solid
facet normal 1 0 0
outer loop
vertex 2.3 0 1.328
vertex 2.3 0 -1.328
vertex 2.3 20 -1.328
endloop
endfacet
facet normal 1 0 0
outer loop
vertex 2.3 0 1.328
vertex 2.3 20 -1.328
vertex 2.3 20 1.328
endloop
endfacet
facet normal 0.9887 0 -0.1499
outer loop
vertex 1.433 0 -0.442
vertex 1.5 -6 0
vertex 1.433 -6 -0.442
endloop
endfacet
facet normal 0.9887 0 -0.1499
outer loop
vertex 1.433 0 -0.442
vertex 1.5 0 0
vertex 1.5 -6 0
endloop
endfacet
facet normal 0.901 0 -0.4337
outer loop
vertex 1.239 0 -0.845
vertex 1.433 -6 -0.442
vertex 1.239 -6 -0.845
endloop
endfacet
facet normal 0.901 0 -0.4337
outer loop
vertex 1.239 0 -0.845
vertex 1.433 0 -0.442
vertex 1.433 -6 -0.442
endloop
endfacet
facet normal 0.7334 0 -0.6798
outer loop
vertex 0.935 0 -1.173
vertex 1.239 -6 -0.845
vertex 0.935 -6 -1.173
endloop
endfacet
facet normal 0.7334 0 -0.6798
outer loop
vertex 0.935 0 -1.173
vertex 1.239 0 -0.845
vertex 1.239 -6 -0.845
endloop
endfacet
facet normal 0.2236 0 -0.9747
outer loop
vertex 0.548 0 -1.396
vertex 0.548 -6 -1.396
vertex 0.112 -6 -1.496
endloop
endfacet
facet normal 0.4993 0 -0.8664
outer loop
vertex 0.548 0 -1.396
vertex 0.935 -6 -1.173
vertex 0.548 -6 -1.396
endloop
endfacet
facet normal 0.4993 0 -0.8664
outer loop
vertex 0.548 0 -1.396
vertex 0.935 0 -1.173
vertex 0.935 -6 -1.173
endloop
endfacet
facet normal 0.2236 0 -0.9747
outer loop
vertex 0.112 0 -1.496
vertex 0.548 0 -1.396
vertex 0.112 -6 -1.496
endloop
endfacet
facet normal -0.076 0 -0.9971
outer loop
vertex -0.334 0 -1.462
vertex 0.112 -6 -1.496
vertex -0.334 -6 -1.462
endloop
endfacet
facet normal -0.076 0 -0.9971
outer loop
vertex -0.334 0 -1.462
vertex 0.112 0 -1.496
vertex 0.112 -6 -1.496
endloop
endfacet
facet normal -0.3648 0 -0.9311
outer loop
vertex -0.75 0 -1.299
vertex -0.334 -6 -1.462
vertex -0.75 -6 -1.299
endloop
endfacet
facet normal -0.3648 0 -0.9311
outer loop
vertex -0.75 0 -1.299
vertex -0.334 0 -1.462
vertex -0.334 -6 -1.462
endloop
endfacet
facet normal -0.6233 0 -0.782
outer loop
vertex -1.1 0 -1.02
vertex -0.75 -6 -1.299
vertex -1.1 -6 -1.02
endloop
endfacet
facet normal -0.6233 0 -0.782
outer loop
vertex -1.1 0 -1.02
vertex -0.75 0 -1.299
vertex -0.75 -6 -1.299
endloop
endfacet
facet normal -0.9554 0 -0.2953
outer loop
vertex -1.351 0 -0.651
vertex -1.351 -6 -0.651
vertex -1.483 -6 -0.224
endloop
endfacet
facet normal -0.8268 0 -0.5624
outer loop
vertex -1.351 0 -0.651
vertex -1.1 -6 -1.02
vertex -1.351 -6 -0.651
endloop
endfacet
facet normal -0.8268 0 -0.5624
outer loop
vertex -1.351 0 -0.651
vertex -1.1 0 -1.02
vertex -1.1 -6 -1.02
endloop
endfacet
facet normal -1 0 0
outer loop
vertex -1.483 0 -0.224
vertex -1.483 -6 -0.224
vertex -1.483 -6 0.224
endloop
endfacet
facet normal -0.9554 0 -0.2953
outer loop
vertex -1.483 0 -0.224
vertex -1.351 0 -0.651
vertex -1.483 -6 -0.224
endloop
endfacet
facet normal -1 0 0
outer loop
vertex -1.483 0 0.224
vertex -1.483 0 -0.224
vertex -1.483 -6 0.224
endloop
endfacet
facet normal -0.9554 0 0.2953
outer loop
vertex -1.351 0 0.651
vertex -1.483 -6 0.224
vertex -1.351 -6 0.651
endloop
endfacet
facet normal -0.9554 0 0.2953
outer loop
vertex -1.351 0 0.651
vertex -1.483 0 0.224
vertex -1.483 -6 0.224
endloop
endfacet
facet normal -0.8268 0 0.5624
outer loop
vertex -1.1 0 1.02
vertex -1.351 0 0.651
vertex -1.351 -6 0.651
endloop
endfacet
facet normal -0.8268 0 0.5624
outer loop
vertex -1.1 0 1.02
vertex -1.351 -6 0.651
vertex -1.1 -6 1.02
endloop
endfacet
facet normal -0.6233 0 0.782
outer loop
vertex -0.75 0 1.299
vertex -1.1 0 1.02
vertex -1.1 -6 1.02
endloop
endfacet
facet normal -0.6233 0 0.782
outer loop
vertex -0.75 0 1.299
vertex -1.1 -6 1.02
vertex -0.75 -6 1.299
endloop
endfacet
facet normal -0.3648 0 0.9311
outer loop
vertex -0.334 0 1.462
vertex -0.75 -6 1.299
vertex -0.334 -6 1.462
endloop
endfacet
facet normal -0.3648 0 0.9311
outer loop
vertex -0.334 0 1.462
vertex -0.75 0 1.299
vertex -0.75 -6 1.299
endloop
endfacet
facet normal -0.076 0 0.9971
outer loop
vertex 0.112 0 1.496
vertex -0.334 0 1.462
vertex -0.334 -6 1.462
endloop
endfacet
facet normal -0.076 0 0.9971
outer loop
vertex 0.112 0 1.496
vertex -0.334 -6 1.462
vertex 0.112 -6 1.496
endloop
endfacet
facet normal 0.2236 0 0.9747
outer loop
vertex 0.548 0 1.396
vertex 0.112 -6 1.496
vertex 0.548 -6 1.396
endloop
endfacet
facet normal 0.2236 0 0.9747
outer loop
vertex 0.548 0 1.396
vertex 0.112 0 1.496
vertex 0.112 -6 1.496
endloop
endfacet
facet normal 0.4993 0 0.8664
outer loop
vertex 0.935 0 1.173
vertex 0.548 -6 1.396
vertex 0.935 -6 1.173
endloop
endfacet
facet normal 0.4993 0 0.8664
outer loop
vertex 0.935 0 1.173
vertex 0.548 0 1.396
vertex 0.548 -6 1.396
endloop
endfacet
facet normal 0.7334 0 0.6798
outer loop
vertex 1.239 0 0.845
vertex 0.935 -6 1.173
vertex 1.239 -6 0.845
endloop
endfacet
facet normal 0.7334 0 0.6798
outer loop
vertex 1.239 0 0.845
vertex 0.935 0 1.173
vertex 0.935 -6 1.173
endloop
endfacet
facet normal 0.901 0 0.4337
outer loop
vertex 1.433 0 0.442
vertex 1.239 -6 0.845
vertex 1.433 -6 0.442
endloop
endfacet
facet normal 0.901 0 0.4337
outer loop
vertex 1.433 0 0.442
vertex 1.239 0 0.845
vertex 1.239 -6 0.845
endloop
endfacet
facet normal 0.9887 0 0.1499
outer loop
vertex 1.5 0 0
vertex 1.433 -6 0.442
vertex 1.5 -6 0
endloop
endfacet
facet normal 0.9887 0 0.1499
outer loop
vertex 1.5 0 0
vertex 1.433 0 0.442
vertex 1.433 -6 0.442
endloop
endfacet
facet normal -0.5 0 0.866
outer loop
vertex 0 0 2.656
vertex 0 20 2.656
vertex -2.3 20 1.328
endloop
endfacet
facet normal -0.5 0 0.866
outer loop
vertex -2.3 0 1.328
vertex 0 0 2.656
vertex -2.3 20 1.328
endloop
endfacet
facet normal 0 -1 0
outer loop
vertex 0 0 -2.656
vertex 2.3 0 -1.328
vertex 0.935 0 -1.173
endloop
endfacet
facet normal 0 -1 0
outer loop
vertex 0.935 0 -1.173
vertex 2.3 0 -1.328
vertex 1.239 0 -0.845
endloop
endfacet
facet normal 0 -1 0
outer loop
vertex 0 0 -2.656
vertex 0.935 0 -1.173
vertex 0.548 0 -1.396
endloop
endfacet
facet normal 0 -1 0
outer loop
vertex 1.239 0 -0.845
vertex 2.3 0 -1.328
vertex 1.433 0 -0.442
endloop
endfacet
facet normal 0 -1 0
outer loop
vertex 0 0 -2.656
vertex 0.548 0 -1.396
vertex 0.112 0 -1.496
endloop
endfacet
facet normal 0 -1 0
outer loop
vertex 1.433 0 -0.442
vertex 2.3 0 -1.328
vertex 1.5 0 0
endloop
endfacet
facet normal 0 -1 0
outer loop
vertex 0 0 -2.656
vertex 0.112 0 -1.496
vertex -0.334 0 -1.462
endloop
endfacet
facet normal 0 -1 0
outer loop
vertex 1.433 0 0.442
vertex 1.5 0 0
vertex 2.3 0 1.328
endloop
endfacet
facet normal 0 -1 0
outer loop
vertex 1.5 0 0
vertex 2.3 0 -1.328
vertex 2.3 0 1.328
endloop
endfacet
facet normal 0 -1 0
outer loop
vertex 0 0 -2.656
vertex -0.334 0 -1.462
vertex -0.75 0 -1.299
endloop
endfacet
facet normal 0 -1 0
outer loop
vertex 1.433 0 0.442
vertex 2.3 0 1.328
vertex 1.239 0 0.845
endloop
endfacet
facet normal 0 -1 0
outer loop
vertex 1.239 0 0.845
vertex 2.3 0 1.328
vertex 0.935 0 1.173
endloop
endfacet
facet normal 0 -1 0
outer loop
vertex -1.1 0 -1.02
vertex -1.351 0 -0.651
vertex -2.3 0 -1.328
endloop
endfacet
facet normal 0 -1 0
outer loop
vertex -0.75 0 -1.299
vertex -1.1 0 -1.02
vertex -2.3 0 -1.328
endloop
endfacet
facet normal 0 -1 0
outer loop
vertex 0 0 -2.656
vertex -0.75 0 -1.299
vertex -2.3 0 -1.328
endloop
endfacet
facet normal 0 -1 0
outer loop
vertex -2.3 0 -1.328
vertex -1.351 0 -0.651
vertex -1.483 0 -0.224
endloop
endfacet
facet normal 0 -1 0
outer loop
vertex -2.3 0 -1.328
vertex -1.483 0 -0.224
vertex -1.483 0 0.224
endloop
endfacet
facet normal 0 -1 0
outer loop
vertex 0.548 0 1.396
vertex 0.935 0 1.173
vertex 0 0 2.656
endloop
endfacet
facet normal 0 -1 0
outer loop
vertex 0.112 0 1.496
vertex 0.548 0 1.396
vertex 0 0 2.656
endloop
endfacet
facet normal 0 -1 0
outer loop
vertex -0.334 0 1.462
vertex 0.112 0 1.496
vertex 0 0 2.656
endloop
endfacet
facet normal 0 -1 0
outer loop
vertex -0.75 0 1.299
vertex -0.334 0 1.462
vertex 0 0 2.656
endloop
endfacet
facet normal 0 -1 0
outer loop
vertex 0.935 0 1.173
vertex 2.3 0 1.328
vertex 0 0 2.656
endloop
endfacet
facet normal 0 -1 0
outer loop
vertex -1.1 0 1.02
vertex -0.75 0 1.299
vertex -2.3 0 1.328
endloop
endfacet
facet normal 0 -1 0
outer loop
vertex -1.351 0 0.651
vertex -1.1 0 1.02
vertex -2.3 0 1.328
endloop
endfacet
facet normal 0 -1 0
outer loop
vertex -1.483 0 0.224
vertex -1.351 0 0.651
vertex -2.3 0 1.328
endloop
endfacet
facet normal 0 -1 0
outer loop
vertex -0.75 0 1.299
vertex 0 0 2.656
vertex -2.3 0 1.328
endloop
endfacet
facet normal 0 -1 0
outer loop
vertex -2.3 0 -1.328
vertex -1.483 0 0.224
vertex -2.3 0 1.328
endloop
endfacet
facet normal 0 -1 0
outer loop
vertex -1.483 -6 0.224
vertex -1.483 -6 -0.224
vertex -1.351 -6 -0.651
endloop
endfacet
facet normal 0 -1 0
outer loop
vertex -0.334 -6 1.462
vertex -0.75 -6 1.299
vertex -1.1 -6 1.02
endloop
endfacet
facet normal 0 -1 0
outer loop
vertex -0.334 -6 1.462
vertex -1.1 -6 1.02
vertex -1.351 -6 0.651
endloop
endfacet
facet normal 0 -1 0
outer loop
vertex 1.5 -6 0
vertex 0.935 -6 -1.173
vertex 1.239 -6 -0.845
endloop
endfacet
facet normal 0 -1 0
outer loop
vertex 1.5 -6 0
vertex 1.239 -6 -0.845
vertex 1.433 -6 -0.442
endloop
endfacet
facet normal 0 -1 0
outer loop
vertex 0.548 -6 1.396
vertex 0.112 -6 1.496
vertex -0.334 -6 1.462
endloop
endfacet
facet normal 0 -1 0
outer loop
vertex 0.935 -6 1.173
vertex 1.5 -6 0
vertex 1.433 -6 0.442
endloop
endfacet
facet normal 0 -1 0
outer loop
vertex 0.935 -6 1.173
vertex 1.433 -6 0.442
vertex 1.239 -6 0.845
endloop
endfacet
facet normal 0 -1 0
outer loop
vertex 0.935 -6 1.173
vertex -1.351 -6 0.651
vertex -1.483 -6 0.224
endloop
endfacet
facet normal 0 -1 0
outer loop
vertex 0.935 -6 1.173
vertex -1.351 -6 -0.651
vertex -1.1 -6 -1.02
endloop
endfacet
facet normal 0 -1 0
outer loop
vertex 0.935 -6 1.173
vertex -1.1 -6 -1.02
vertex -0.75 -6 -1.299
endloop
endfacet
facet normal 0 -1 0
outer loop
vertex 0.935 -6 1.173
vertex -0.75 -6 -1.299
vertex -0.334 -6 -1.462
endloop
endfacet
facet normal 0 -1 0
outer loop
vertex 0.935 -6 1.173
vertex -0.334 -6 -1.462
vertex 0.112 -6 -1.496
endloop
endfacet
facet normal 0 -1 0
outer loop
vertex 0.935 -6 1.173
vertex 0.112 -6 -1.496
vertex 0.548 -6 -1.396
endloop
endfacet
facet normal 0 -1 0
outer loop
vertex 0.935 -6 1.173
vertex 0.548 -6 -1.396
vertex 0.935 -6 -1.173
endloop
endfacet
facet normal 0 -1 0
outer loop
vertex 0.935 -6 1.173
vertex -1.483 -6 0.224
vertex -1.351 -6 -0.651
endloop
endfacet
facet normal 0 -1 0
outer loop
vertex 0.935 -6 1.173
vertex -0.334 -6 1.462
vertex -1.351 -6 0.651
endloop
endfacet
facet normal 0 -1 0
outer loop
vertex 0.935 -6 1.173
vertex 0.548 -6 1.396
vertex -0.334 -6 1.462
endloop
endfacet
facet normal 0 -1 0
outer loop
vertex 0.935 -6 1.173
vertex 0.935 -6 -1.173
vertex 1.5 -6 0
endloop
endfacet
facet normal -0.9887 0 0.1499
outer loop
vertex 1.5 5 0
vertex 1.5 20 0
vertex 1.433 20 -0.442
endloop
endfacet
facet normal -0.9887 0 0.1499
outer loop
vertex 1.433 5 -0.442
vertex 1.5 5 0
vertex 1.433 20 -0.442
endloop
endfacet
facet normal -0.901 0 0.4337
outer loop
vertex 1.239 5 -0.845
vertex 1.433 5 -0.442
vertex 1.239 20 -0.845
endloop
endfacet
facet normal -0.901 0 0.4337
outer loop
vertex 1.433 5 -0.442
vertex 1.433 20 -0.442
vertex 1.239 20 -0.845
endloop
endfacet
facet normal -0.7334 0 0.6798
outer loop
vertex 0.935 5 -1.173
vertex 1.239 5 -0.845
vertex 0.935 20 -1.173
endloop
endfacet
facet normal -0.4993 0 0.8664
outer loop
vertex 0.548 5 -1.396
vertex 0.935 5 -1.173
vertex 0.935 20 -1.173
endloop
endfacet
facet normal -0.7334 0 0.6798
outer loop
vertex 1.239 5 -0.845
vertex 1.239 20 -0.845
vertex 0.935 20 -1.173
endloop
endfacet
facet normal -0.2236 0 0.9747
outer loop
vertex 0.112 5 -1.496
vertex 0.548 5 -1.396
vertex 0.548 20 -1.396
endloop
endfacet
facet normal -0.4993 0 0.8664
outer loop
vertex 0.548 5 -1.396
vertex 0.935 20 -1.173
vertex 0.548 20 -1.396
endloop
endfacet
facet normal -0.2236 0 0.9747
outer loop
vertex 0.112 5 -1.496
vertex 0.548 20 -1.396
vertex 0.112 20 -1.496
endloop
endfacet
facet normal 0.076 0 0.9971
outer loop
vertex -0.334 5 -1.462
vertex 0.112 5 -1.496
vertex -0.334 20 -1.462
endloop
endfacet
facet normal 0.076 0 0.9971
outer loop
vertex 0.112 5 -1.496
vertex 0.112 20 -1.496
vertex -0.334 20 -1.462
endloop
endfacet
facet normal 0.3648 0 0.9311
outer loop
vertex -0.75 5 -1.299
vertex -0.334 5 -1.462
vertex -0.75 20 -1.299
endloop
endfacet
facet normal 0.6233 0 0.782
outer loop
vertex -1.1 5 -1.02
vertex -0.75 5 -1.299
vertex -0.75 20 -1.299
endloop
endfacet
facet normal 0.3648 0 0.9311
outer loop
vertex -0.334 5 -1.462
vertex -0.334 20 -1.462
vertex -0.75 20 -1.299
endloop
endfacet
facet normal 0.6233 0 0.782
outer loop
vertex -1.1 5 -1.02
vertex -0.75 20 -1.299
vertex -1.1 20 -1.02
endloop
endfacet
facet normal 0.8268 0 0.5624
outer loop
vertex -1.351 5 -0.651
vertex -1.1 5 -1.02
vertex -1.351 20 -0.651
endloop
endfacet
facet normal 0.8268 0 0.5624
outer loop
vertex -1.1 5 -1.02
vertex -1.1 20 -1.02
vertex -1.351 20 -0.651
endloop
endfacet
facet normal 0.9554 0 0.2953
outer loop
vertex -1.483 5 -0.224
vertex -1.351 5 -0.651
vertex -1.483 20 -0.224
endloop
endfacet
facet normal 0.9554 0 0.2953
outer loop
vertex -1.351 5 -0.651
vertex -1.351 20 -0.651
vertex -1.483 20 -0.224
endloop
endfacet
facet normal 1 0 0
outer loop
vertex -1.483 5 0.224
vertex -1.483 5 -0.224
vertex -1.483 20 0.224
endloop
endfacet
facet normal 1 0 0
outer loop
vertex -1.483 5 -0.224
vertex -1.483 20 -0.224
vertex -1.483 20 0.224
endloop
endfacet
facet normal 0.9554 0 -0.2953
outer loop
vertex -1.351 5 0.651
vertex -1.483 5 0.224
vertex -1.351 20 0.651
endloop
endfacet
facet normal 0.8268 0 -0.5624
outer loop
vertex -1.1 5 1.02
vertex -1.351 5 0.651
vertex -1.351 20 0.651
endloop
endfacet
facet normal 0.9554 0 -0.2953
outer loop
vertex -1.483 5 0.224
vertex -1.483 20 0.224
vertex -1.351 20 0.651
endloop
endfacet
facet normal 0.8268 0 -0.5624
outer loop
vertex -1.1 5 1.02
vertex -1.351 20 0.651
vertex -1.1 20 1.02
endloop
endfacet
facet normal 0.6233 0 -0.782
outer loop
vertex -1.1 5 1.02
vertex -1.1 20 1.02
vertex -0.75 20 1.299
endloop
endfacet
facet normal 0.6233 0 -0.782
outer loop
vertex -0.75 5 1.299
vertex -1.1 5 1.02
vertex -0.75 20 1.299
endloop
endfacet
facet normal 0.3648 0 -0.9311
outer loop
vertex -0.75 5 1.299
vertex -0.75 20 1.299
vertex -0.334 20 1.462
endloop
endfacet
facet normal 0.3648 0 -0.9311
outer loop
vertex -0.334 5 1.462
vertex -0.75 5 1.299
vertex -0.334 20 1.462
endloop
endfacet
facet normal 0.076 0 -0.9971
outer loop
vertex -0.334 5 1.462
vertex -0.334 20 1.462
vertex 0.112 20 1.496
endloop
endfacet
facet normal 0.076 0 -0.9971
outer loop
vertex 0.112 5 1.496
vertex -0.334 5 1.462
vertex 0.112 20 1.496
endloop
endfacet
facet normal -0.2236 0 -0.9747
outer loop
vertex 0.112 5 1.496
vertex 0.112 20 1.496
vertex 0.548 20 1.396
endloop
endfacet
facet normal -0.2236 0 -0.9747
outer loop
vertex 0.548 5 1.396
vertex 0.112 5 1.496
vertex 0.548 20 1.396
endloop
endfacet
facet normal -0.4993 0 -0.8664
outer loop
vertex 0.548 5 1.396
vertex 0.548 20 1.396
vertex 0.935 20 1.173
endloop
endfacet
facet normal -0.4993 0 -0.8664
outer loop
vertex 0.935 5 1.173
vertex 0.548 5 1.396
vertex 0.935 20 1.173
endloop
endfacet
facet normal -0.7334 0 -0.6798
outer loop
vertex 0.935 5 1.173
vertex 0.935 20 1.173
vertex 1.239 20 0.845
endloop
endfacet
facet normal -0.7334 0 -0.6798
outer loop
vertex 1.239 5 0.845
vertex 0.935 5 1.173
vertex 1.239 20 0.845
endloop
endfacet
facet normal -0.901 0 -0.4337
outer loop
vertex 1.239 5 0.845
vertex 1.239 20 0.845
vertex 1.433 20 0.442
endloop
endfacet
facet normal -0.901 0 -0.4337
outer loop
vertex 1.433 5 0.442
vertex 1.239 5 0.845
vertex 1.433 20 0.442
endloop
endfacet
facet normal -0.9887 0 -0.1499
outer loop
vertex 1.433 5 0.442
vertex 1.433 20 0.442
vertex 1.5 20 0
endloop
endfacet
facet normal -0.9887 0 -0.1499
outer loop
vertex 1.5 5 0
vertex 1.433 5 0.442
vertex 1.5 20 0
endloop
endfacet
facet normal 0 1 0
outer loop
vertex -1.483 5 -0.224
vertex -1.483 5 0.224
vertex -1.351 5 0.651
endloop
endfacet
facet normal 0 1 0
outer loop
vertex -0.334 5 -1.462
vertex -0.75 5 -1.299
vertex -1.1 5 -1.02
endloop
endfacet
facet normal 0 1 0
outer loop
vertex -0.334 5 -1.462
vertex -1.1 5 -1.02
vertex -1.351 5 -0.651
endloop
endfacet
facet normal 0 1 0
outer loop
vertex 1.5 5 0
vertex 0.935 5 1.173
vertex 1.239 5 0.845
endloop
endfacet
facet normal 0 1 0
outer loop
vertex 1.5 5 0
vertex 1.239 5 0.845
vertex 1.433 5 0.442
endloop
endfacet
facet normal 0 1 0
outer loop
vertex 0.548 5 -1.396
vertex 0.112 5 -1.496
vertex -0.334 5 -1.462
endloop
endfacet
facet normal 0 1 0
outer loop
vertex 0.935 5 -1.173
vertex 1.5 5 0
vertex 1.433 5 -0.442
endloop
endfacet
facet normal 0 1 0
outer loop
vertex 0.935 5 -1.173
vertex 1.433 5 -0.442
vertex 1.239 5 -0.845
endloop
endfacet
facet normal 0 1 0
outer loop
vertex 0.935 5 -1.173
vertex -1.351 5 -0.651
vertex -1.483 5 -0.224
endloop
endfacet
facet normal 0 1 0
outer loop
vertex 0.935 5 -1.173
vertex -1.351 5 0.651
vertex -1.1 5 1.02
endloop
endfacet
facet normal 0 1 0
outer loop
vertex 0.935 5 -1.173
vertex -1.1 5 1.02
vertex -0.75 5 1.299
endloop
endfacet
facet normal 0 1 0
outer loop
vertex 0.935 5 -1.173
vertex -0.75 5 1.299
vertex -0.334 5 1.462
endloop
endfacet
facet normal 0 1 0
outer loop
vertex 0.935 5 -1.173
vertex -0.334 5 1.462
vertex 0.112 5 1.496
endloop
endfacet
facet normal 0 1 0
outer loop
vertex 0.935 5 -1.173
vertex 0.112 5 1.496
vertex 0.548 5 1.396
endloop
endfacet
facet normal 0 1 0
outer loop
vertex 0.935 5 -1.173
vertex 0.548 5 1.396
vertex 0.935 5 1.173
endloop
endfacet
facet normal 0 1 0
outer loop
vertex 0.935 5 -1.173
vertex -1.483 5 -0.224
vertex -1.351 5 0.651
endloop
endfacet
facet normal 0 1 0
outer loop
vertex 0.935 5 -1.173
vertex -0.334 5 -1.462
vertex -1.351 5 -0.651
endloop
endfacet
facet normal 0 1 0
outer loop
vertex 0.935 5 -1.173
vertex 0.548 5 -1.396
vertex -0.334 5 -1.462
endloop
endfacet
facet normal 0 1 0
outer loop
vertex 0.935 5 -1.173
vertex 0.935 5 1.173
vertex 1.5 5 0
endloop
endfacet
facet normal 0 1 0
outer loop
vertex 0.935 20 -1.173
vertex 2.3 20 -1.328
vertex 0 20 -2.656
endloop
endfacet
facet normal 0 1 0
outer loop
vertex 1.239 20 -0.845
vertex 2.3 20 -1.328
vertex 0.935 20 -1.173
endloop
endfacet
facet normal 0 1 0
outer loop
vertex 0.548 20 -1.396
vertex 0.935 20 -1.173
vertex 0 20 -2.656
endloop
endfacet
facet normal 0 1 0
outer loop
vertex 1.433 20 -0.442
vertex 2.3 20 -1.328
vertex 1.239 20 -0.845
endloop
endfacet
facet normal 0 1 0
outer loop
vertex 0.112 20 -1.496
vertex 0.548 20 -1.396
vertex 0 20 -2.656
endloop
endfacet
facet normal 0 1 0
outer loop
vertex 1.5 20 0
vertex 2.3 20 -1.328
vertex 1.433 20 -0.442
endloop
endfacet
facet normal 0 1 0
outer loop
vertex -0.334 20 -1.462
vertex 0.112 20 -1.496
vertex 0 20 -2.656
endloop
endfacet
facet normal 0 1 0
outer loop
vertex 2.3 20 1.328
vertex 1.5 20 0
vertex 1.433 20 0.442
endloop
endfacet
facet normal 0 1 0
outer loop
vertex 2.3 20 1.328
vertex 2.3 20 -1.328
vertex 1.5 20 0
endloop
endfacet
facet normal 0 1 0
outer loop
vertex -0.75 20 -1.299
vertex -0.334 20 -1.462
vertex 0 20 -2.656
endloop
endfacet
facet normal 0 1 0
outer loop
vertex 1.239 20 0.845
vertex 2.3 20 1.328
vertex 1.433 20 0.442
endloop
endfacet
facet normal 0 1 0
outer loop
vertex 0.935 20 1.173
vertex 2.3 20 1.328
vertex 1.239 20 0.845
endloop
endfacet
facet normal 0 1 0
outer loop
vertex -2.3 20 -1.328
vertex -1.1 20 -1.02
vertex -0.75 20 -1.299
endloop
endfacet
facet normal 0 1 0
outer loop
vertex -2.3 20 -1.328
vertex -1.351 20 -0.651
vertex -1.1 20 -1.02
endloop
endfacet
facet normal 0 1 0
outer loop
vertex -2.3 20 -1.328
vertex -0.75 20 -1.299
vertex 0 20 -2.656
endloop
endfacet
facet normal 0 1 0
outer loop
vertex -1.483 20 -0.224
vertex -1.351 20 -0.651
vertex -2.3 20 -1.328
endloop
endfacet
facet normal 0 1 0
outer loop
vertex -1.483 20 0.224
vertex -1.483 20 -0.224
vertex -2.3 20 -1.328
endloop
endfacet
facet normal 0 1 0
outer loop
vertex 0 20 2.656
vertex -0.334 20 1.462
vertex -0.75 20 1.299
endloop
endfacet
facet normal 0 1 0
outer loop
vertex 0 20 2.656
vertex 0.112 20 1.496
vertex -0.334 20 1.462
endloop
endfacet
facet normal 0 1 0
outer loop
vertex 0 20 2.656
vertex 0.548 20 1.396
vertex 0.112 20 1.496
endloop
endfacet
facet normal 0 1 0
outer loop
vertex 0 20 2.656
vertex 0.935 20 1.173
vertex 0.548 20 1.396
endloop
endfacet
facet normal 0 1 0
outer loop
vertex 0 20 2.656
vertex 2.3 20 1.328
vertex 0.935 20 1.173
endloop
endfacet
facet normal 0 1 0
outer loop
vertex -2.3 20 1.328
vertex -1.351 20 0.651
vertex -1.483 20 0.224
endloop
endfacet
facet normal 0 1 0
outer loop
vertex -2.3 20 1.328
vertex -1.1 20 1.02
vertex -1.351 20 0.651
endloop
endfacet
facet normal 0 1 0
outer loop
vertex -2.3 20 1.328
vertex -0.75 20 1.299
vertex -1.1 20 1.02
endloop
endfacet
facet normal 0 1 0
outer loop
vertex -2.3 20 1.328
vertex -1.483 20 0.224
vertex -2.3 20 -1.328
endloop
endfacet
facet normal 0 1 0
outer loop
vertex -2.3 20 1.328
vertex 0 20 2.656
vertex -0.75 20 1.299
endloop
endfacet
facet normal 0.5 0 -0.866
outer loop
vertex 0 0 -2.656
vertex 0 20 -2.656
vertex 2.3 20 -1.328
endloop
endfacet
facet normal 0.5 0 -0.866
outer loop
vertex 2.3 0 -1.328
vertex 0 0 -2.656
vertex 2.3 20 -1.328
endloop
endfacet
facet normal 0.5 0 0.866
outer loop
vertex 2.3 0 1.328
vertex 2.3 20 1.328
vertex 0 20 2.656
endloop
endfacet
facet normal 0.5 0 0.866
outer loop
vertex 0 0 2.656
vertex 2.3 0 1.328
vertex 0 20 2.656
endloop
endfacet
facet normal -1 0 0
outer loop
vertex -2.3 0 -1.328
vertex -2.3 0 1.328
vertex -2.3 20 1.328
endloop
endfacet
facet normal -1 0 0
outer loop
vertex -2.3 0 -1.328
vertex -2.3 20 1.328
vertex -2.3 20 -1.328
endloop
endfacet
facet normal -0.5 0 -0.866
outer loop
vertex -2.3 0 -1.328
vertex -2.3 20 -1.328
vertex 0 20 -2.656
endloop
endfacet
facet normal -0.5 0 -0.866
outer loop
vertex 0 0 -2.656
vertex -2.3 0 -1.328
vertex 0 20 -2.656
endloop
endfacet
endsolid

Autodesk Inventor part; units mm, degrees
ref_plane "YZ Plane" through (0, 0, 0) normal (1, 0, 0) x (0, 1, 0)
ref_plane "XZ Plane" through (0, 0, 0) normal (0, 1, 0) x (-1, 0, 0)
ref_plane "XY Plane" through (0, 0, 0) normal (0, 0, 1) x (1, 0, 0)
sketch "Sketch1" plane through (0, 0, 0) normal (0, 1, 0) x (-1, 0, 0)
  line L0 (0, -2.6558) -> (-2.3, -1.3279)
  line L1 (-2.3, -1.3279) -> (-2.3, 1.3279)
  line L2 (-2.3, 1.3279) -> (0, 2.6558)
  line L3 (0, 2.6558) -> (2.3, 1.3279)
  line L4 (2.3, 1.3279) -> (2.3, -1.3279)
  line L5 (2.3, -1.3279) -> (0, -2.6558)
  point P0 (0, 0)
  point P1 (0, 0)
  dimension "d0" = 4.6
extrude "Extrusion1" add sketch "Sketch1" along normal blind 20
sketch "Sketch2" plane through (0, 20, 0) normal (0, 1, 0) x (1, 0, 0)
  circle A0 centre (0, 0) radius 1.5
  dimension "d3" = 3
extrude "Extrusion2" cut sketch "Sketch2" against normal blind 15
sketch "Sketch3" plane through (0, 0, 0) normal (0, -1, 0) x (1, 0, 0)
  circle A0 centre (0, 0) radius 1.5
  dimension "d6" = 3
extrude "Extrusion3" add sketch "Sketch3" along normal blind 6
properties part number "Separador-M3-20mm-Pin" material "Stainless Steel"
